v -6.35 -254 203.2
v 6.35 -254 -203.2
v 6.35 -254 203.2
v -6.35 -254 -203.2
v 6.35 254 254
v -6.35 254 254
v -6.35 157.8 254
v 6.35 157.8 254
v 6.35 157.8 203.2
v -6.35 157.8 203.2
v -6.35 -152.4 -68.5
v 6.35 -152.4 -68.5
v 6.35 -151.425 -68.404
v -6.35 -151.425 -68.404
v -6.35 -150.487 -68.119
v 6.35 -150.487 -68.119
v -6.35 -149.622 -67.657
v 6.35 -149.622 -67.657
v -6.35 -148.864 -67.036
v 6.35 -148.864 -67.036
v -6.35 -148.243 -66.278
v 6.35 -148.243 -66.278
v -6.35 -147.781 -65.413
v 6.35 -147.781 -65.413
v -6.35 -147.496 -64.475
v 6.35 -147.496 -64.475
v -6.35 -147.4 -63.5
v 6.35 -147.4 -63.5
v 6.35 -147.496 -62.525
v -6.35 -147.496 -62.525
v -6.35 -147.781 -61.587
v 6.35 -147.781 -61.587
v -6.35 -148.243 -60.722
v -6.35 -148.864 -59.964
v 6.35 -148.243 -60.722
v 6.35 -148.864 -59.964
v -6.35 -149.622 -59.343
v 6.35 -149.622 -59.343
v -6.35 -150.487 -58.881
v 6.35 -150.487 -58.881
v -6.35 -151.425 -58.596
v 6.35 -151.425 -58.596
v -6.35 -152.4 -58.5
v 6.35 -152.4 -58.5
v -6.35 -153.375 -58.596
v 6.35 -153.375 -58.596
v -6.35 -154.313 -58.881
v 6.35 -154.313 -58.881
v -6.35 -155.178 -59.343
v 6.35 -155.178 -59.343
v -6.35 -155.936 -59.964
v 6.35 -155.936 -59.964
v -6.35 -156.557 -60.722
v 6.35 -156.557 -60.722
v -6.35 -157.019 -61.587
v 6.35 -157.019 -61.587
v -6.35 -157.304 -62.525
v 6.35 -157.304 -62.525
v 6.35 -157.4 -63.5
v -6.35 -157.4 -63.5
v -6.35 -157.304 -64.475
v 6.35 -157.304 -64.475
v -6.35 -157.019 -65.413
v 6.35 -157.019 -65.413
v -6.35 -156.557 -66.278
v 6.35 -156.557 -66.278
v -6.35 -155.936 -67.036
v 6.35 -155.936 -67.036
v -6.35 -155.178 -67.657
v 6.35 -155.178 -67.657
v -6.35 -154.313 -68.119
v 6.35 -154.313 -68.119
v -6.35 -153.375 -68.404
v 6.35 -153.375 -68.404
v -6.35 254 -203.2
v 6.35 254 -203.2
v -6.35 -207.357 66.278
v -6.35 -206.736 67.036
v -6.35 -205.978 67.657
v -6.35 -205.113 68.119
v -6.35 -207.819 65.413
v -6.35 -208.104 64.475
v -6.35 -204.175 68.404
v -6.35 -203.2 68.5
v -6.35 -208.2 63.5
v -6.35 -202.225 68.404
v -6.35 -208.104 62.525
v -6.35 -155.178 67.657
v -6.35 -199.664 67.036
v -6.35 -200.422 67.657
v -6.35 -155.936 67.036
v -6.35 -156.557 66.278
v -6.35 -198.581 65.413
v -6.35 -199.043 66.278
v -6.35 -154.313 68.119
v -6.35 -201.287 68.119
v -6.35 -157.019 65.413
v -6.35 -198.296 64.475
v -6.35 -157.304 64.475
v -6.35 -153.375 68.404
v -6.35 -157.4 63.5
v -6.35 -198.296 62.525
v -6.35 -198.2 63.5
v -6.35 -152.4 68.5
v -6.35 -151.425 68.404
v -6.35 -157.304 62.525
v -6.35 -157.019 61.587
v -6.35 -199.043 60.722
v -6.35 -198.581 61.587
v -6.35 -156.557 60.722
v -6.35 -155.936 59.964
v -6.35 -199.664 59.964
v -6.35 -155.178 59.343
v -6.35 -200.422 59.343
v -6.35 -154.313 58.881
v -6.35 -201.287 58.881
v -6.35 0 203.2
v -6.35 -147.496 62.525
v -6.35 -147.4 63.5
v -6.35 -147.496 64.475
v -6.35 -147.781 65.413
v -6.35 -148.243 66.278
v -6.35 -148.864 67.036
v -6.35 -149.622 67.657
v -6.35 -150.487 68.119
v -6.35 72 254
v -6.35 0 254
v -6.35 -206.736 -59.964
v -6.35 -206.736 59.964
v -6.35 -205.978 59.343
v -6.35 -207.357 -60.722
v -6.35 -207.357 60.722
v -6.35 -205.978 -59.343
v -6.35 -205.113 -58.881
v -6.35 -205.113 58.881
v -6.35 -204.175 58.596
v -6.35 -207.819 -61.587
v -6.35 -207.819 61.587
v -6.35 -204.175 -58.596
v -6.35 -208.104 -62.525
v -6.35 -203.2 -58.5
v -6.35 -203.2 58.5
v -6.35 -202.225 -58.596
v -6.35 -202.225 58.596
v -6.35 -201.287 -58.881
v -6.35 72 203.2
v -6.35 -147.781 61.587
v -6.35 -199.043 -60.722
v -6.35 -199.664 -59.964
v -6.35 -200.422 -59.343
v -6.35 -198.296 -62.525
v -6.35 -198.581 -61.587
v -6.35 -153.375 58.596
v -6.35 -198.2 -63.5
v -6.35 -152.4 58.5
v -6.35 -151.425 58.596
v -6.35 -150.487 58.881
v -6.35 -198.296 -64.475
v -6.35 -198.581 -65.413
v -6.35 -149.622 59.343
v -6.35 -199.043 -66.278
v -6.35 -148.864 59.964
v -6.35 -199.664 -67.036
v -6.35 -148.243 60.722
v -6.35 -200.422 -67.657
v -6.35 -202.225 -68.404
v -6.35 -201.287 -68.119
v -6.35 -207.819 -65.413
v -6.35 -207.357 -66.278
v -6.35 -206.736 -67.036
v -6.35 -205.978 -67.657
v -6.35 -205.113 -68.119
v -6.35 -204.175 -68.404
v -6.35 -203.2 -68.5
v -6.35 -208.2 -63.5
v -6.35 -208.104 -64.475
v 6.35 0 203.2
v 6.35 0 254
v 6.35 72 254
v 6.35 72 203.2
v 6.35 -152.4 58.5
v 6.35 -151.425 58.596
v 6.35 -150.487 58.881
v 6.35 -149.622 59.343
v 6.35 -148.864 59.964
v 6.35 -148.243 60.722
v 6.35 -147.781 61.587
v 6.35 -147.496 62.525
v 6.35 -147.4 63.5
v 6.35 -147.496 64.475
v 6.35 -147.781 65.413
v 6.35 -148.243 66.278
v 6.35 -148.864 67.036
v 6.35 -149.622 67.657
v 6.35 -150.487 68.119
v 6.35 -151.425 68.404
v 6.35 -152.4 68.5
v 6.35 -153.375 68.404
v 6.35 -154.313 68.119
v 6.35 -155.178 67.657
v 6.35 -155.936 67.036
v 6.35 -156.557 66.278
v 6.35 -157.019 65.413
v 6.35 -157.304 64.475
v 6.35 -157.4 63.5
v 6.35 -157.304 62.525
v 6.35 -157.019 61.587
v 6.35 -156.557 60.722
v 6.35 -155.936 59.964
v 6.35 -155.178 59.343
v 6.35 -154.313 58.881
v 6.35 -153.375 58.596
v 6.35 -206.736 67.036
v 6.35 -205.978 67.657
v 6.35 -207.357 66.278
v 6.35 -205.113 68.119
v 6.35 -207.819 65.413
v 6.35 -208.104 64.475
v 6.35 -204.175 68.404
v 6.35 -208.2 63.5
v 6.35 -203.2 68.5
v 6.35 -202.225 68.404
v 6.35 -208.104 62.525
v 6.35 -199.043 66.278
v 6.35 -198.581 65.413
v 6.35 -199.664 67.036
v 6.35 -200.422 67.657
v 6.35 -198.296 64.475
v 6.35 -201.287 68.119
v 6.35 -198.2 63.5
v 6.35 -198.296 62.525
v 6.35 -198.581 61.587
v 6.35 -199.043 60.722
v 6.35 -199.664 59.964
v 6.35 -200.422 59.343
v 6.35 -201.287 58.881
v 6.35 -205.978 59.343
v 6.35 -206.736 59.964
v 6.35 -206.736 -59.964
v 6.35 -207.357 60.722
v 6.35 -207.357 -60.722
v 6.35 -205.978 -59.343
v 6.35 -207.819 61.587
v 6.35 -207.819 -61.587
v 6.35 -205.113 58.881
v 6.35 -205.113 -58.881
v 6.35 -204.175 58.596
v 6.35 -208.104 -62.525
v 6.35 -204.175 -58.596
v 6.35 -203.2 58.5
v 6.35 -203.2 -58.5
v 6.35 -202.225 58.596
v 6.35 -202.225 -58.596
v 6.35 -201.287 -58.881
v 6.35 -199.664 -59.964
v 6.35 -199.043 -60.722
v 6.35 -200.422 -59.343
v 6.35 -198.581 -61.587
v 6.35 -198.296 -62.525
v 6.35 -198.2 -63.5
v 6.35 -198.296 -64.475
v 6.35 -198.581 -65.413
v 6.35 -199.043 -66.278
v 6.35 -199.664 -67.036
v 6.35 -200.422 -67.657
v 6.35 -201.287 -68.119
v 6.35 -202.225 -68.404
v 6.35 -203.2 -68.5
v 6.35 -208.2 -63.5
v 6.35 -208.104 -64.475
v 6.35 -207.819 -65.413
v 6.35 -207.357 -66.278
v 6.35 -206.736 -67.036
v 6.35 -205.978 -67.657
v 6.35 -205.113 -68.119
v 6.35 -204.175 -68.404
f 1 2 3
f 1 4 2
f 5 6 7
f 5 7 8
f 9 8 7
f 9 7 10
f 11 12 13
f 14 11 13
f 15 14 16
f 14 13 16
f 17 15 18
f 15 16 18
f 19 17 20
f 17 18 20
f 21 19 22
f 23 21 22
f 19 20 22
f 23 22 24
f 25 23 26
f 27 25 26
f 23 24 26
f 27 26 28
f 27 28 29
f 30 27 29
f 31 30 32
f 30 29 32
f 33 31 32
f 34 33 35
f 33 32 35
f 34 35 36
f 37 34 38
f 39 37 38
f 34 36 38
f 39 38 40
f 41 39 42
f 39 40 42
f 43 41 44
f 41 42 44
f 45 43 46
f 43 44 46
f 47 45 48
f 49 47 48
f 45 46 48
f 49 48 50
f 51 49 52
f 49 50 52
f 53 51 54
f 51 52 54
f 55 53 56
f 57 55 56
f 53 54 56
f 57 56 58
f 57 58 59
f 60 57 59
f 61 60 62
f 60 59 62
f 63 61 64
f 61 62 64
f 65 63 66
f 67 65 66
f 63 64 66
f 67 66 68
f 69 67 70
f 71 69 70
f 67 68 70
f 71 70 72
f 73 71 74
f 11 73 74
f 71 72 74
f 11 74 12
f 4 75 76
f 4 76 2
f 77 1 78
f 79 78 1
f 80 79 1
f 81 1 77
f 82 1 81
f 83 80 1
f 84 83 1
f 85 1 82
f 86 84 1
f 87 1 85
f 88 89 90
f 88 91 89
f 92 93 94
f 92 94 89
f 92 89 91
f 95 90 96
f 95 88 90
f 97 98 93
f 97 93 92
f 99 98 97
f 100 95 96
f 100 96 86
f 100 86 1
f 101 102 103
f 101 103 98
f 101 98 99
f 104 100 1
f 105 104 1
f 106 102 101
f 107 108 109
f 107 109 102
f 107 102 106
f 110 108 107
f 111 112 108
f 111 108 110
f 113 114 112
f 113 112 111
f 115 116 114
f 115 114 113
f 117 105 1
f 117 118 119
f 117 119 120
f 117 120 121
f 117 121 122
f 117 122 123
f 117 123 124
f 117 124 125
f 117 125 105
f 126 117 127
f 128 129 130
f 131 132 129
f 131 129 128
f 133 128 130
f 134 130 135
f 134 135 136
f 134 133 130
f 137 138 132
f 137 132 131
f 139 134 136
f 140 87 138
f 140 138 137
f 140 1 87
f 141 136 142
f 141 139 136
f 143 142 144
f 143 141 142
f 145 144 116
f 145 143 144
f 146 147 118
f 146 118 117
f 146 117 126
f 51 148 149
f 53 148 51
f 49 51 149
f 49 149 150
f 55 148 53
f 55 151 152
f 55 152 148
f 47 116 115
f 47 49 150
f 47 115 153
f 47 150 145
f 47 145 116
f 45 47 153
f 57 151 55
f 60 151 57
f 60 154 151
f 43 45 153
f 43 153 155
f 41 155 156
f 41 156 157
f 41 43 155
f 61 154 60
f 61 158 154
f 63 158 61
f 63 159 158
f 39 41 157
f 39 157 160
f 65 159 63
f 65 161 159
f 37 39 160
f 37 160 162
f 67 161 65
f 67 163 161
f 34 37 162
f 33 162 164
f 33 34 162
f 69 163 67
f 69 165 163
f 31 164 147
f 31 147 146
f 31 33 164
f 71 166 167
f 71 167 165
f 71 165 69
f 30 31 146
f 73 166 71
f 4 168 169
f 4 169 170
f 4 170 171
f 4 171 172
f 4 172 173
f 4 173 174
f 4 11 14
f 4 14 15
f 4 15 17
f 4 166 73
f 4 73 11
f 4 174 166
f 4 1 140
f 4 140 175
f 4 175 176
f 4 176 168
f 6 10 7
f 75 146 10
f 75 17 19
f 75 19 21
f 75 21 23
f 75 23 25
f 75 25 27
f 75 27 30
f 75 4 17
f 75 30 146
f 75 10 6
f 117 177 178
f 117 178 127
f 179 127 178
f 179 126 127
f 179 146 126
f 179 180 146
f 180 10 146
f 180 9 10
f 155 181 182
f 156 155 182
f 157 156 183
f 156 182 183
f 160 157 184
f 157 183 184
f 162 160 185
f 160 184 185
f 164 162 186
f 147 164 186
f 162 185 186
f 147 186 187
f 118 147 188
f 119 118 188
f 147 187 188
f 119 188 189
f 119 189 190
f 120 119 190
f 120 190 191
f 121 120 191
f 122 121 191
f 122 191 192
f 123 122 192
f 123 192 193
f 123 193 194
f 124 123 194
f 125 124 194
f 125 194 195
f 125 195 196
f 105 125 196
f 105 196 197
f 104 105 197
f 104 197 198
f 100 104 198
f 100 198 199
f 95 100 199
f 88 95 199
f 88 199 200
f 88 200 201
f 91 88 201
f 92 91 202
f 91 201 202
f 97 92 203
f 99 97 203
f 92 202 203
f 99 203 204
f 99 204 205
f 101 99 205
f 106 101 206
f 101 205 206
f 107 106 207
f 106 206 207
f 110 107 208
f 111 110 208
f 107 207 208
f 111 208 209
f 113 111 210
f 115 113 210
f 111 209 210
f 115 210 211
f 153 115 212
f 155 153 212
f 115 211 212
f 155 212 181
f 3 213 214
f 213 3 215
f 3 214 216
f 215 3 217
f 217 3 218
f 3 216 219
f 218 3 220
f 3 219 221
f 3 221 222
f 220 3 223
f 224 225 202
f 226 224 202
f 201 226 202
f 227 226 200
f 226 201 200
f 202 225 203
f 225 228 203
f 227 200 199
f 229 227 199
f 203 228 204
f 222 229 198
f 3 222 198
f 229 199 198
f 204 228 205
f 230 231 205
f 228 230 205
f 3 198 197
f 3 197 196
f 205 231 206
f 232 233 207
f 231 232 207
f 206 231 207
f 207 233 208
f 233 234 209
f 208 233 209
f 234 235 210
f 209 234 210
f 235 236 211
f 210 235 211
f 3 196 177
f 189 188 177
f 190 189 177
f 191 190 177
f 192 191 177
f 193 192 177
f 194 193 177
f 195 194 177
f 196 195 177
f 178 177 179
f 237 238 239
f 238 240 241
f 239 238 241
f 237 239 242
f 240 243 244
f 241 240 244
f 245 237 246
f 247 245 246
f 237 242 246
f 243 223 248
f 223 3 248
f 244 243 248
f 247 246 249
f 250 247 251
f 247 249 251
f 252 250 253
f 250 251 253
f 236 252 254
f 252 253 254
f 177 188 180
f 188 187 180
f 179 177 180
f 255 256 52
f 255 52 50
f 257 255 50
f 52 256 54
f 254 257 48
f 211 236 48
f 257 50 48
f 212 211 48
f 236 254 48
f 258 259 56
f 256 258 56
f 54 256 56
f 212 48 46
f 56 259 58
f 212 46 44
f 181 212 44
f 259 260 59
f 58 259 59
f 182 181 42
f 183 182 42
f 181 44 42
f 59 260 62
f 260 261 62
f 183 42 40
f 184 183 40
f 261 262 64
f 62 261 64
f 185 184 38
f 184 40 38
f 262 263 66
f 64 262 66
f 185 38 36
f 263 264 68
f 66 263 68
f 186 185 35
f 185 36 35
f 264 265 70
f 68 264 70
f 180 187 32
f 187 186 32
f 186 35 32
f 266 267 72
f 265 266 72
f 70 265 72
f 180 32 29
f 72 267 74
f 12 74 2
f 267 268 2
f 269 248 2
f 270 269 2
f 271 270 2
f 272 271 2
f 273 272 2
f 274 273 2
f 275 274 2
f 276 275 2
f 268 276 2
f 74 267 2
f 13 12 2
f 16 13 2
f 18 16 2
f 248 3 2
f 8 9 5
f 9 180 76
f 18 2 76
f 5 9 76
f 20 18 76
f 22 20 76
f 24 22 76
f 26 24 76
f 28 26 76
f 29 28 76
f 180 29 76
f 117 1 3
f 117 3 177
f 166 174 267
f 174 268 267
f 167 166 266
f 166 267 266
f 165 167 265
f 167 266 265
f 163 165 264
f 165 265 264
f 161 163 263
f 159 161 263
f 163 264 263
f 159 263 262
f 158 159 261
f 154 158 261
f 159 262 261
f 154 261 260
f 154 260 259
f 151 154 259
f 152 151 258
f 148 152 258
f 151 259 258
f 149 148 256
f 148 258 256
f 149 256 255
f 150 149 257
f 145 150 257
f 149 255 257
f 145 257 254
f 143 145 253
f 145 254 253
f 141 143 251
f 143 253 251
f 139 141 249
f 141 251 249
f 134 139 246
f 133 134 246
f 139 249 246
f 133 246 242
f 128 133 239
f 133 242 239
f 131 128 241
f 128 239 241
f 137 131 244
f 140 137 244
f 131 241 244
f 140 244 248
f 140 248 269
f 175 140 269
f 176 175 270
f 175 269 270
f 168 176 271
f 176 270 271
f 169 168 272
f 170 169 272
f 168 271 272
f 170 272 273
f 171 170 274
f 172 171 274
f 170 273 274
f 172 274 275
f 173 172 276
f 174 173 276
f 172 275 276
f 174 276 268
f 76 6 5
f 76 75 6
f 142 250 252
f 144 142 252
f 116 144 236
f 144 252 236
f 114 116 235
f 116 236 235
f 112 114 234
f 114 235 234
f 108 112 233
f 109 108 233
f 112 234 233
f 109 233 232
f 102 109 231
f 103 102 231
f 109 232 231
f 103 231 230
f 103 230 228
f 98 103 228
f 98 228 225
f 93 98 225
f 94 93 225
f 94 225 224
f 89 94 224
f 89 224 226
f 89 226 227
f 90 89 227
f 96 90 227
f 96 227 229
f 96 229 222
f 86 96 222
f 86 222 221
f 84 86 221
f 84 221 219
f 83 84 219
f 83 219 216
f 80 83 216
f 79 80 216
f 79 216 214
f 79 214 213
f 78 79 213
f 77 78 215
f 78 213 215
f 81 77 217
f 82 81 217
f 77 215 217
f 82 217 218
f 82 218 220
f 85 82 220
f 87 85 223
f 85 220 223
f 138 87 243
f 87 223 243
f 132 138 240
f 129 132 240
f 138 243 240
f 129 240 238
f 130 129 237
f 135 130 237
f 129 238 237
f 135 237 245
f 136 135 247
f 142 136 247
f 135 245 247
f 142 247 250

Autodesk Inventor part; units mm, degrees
ref_plane "YZ Plane" through (0, 0, 0) normal (1, 0, 0) x (0, 1, 0)
ref_plane "XZ Plane" through (0, 0, 0) normal (0, 1, 0) x (-1, 0, 0)
ref_plane "XY Plane" through (0, 0, 0) normal (0, 0, 1) x (1, 0, 0)
sketch "Sketch1" plane through (0, 0, 0) normal (1, 0, 0) x (0, 1, 0)
  line L0 (-254, 203.2) -> (254, 203.2)
  line L1 (254, 203.2) -> (254, -203.2)
  line L2 (254, -203.2) -> (-254, -203.2)
  line L3 (-254, -203.2) -> (-254, 203.2)
  line L4 (-254, 203.2) -> (254, -203.2) construction
  line L5 (254, 203.2) -> (-254, -203.2) construction
  point P0 (0, 0)
  dimension "d0" = 406.4
  dimension "d1" = 508
extrude "Extrusion1" add sketch "Sketch1" along normal mid plane 12.7
sketch "Sketch2" plane through (6.35, 0, 0) normal (1, 0, 0) x (0, 0, -1)
  circle A0 centre (-63.5, -203.2) radius 5
  line L0 (203.2, -254) -> (203.2, 254) projected
  line L1 (203.2, 254) -> (-203.2, 254) projected
  line L2 (-203.2, 254) -> (-203.2, -254) projected
  line L3 (-203.2, -254) -> (203.2, -254) projected
  circle A1 centre (63.5, -203.2) radius 5
  circle A2 centre (-63.5, -152.4) radius 5
  circle A3 centre (63.5, -152.4) radius 5
  point P0 (0, 0)
  dimension "d6" = 127
  dimension "d9" = 50.8
  dimension "d12" = 10
  dimension "d14" = 63.5
  dimension "d15" = 50.8
extrude "Extrusion2" cut sketch "Sketch2" against normal blind 12.7 contours A0 | A1 | A2 | A3
sketch "Sketch3" plane through (-6.35, -254, 203.2) normal (0, 0, 1) x (1, 0, 0)
  line L0 (0, 508) -> (12.7, 508) projected
  line L1 (12.7, 0) -> (12.7, 508) projected
  line L2 (0, 508) -> (12.7, 508)
  line L3 (12.7, 508) -> (12.7, 254)
  line L4 (12.7, 254) -> (0, 254)
  line L5 (0, 254) -> (0, 508)
  point P0 (6.35, 254)
  dimension "d26" = 254
extrude "Extrusion3" add sketch "Sketch3" along normal blind 50.8
sketch "Sketch4" plane through (6.35, 0, 0) normal (1, 0, 0) x (0, 0, -1)
  line L0 (-254, 157.8) -> (-203.2, 157.8)
  line L1 (-203.2, 157.8) -> (-203.2, 72)
  line L2 (-203.2, 72) -> (-254, 72)
  line L3 (-254, 72) -> (-254, 157.8)
  line L4 (-254, 0) -> (-254, 254) projected
  line L5 (203.2, 254) -> (-254, 254) projected
  point P0 (0, 0)
  dimension "d20" = 0
  dimension "d21" = 96.2
  dimension "d22" = 50.8
  dimension "d23" = 85.8
extrude "Extrusion4" cut sketch "Sketch4" against normal blind 50.8
properties part number "Wood-6"
